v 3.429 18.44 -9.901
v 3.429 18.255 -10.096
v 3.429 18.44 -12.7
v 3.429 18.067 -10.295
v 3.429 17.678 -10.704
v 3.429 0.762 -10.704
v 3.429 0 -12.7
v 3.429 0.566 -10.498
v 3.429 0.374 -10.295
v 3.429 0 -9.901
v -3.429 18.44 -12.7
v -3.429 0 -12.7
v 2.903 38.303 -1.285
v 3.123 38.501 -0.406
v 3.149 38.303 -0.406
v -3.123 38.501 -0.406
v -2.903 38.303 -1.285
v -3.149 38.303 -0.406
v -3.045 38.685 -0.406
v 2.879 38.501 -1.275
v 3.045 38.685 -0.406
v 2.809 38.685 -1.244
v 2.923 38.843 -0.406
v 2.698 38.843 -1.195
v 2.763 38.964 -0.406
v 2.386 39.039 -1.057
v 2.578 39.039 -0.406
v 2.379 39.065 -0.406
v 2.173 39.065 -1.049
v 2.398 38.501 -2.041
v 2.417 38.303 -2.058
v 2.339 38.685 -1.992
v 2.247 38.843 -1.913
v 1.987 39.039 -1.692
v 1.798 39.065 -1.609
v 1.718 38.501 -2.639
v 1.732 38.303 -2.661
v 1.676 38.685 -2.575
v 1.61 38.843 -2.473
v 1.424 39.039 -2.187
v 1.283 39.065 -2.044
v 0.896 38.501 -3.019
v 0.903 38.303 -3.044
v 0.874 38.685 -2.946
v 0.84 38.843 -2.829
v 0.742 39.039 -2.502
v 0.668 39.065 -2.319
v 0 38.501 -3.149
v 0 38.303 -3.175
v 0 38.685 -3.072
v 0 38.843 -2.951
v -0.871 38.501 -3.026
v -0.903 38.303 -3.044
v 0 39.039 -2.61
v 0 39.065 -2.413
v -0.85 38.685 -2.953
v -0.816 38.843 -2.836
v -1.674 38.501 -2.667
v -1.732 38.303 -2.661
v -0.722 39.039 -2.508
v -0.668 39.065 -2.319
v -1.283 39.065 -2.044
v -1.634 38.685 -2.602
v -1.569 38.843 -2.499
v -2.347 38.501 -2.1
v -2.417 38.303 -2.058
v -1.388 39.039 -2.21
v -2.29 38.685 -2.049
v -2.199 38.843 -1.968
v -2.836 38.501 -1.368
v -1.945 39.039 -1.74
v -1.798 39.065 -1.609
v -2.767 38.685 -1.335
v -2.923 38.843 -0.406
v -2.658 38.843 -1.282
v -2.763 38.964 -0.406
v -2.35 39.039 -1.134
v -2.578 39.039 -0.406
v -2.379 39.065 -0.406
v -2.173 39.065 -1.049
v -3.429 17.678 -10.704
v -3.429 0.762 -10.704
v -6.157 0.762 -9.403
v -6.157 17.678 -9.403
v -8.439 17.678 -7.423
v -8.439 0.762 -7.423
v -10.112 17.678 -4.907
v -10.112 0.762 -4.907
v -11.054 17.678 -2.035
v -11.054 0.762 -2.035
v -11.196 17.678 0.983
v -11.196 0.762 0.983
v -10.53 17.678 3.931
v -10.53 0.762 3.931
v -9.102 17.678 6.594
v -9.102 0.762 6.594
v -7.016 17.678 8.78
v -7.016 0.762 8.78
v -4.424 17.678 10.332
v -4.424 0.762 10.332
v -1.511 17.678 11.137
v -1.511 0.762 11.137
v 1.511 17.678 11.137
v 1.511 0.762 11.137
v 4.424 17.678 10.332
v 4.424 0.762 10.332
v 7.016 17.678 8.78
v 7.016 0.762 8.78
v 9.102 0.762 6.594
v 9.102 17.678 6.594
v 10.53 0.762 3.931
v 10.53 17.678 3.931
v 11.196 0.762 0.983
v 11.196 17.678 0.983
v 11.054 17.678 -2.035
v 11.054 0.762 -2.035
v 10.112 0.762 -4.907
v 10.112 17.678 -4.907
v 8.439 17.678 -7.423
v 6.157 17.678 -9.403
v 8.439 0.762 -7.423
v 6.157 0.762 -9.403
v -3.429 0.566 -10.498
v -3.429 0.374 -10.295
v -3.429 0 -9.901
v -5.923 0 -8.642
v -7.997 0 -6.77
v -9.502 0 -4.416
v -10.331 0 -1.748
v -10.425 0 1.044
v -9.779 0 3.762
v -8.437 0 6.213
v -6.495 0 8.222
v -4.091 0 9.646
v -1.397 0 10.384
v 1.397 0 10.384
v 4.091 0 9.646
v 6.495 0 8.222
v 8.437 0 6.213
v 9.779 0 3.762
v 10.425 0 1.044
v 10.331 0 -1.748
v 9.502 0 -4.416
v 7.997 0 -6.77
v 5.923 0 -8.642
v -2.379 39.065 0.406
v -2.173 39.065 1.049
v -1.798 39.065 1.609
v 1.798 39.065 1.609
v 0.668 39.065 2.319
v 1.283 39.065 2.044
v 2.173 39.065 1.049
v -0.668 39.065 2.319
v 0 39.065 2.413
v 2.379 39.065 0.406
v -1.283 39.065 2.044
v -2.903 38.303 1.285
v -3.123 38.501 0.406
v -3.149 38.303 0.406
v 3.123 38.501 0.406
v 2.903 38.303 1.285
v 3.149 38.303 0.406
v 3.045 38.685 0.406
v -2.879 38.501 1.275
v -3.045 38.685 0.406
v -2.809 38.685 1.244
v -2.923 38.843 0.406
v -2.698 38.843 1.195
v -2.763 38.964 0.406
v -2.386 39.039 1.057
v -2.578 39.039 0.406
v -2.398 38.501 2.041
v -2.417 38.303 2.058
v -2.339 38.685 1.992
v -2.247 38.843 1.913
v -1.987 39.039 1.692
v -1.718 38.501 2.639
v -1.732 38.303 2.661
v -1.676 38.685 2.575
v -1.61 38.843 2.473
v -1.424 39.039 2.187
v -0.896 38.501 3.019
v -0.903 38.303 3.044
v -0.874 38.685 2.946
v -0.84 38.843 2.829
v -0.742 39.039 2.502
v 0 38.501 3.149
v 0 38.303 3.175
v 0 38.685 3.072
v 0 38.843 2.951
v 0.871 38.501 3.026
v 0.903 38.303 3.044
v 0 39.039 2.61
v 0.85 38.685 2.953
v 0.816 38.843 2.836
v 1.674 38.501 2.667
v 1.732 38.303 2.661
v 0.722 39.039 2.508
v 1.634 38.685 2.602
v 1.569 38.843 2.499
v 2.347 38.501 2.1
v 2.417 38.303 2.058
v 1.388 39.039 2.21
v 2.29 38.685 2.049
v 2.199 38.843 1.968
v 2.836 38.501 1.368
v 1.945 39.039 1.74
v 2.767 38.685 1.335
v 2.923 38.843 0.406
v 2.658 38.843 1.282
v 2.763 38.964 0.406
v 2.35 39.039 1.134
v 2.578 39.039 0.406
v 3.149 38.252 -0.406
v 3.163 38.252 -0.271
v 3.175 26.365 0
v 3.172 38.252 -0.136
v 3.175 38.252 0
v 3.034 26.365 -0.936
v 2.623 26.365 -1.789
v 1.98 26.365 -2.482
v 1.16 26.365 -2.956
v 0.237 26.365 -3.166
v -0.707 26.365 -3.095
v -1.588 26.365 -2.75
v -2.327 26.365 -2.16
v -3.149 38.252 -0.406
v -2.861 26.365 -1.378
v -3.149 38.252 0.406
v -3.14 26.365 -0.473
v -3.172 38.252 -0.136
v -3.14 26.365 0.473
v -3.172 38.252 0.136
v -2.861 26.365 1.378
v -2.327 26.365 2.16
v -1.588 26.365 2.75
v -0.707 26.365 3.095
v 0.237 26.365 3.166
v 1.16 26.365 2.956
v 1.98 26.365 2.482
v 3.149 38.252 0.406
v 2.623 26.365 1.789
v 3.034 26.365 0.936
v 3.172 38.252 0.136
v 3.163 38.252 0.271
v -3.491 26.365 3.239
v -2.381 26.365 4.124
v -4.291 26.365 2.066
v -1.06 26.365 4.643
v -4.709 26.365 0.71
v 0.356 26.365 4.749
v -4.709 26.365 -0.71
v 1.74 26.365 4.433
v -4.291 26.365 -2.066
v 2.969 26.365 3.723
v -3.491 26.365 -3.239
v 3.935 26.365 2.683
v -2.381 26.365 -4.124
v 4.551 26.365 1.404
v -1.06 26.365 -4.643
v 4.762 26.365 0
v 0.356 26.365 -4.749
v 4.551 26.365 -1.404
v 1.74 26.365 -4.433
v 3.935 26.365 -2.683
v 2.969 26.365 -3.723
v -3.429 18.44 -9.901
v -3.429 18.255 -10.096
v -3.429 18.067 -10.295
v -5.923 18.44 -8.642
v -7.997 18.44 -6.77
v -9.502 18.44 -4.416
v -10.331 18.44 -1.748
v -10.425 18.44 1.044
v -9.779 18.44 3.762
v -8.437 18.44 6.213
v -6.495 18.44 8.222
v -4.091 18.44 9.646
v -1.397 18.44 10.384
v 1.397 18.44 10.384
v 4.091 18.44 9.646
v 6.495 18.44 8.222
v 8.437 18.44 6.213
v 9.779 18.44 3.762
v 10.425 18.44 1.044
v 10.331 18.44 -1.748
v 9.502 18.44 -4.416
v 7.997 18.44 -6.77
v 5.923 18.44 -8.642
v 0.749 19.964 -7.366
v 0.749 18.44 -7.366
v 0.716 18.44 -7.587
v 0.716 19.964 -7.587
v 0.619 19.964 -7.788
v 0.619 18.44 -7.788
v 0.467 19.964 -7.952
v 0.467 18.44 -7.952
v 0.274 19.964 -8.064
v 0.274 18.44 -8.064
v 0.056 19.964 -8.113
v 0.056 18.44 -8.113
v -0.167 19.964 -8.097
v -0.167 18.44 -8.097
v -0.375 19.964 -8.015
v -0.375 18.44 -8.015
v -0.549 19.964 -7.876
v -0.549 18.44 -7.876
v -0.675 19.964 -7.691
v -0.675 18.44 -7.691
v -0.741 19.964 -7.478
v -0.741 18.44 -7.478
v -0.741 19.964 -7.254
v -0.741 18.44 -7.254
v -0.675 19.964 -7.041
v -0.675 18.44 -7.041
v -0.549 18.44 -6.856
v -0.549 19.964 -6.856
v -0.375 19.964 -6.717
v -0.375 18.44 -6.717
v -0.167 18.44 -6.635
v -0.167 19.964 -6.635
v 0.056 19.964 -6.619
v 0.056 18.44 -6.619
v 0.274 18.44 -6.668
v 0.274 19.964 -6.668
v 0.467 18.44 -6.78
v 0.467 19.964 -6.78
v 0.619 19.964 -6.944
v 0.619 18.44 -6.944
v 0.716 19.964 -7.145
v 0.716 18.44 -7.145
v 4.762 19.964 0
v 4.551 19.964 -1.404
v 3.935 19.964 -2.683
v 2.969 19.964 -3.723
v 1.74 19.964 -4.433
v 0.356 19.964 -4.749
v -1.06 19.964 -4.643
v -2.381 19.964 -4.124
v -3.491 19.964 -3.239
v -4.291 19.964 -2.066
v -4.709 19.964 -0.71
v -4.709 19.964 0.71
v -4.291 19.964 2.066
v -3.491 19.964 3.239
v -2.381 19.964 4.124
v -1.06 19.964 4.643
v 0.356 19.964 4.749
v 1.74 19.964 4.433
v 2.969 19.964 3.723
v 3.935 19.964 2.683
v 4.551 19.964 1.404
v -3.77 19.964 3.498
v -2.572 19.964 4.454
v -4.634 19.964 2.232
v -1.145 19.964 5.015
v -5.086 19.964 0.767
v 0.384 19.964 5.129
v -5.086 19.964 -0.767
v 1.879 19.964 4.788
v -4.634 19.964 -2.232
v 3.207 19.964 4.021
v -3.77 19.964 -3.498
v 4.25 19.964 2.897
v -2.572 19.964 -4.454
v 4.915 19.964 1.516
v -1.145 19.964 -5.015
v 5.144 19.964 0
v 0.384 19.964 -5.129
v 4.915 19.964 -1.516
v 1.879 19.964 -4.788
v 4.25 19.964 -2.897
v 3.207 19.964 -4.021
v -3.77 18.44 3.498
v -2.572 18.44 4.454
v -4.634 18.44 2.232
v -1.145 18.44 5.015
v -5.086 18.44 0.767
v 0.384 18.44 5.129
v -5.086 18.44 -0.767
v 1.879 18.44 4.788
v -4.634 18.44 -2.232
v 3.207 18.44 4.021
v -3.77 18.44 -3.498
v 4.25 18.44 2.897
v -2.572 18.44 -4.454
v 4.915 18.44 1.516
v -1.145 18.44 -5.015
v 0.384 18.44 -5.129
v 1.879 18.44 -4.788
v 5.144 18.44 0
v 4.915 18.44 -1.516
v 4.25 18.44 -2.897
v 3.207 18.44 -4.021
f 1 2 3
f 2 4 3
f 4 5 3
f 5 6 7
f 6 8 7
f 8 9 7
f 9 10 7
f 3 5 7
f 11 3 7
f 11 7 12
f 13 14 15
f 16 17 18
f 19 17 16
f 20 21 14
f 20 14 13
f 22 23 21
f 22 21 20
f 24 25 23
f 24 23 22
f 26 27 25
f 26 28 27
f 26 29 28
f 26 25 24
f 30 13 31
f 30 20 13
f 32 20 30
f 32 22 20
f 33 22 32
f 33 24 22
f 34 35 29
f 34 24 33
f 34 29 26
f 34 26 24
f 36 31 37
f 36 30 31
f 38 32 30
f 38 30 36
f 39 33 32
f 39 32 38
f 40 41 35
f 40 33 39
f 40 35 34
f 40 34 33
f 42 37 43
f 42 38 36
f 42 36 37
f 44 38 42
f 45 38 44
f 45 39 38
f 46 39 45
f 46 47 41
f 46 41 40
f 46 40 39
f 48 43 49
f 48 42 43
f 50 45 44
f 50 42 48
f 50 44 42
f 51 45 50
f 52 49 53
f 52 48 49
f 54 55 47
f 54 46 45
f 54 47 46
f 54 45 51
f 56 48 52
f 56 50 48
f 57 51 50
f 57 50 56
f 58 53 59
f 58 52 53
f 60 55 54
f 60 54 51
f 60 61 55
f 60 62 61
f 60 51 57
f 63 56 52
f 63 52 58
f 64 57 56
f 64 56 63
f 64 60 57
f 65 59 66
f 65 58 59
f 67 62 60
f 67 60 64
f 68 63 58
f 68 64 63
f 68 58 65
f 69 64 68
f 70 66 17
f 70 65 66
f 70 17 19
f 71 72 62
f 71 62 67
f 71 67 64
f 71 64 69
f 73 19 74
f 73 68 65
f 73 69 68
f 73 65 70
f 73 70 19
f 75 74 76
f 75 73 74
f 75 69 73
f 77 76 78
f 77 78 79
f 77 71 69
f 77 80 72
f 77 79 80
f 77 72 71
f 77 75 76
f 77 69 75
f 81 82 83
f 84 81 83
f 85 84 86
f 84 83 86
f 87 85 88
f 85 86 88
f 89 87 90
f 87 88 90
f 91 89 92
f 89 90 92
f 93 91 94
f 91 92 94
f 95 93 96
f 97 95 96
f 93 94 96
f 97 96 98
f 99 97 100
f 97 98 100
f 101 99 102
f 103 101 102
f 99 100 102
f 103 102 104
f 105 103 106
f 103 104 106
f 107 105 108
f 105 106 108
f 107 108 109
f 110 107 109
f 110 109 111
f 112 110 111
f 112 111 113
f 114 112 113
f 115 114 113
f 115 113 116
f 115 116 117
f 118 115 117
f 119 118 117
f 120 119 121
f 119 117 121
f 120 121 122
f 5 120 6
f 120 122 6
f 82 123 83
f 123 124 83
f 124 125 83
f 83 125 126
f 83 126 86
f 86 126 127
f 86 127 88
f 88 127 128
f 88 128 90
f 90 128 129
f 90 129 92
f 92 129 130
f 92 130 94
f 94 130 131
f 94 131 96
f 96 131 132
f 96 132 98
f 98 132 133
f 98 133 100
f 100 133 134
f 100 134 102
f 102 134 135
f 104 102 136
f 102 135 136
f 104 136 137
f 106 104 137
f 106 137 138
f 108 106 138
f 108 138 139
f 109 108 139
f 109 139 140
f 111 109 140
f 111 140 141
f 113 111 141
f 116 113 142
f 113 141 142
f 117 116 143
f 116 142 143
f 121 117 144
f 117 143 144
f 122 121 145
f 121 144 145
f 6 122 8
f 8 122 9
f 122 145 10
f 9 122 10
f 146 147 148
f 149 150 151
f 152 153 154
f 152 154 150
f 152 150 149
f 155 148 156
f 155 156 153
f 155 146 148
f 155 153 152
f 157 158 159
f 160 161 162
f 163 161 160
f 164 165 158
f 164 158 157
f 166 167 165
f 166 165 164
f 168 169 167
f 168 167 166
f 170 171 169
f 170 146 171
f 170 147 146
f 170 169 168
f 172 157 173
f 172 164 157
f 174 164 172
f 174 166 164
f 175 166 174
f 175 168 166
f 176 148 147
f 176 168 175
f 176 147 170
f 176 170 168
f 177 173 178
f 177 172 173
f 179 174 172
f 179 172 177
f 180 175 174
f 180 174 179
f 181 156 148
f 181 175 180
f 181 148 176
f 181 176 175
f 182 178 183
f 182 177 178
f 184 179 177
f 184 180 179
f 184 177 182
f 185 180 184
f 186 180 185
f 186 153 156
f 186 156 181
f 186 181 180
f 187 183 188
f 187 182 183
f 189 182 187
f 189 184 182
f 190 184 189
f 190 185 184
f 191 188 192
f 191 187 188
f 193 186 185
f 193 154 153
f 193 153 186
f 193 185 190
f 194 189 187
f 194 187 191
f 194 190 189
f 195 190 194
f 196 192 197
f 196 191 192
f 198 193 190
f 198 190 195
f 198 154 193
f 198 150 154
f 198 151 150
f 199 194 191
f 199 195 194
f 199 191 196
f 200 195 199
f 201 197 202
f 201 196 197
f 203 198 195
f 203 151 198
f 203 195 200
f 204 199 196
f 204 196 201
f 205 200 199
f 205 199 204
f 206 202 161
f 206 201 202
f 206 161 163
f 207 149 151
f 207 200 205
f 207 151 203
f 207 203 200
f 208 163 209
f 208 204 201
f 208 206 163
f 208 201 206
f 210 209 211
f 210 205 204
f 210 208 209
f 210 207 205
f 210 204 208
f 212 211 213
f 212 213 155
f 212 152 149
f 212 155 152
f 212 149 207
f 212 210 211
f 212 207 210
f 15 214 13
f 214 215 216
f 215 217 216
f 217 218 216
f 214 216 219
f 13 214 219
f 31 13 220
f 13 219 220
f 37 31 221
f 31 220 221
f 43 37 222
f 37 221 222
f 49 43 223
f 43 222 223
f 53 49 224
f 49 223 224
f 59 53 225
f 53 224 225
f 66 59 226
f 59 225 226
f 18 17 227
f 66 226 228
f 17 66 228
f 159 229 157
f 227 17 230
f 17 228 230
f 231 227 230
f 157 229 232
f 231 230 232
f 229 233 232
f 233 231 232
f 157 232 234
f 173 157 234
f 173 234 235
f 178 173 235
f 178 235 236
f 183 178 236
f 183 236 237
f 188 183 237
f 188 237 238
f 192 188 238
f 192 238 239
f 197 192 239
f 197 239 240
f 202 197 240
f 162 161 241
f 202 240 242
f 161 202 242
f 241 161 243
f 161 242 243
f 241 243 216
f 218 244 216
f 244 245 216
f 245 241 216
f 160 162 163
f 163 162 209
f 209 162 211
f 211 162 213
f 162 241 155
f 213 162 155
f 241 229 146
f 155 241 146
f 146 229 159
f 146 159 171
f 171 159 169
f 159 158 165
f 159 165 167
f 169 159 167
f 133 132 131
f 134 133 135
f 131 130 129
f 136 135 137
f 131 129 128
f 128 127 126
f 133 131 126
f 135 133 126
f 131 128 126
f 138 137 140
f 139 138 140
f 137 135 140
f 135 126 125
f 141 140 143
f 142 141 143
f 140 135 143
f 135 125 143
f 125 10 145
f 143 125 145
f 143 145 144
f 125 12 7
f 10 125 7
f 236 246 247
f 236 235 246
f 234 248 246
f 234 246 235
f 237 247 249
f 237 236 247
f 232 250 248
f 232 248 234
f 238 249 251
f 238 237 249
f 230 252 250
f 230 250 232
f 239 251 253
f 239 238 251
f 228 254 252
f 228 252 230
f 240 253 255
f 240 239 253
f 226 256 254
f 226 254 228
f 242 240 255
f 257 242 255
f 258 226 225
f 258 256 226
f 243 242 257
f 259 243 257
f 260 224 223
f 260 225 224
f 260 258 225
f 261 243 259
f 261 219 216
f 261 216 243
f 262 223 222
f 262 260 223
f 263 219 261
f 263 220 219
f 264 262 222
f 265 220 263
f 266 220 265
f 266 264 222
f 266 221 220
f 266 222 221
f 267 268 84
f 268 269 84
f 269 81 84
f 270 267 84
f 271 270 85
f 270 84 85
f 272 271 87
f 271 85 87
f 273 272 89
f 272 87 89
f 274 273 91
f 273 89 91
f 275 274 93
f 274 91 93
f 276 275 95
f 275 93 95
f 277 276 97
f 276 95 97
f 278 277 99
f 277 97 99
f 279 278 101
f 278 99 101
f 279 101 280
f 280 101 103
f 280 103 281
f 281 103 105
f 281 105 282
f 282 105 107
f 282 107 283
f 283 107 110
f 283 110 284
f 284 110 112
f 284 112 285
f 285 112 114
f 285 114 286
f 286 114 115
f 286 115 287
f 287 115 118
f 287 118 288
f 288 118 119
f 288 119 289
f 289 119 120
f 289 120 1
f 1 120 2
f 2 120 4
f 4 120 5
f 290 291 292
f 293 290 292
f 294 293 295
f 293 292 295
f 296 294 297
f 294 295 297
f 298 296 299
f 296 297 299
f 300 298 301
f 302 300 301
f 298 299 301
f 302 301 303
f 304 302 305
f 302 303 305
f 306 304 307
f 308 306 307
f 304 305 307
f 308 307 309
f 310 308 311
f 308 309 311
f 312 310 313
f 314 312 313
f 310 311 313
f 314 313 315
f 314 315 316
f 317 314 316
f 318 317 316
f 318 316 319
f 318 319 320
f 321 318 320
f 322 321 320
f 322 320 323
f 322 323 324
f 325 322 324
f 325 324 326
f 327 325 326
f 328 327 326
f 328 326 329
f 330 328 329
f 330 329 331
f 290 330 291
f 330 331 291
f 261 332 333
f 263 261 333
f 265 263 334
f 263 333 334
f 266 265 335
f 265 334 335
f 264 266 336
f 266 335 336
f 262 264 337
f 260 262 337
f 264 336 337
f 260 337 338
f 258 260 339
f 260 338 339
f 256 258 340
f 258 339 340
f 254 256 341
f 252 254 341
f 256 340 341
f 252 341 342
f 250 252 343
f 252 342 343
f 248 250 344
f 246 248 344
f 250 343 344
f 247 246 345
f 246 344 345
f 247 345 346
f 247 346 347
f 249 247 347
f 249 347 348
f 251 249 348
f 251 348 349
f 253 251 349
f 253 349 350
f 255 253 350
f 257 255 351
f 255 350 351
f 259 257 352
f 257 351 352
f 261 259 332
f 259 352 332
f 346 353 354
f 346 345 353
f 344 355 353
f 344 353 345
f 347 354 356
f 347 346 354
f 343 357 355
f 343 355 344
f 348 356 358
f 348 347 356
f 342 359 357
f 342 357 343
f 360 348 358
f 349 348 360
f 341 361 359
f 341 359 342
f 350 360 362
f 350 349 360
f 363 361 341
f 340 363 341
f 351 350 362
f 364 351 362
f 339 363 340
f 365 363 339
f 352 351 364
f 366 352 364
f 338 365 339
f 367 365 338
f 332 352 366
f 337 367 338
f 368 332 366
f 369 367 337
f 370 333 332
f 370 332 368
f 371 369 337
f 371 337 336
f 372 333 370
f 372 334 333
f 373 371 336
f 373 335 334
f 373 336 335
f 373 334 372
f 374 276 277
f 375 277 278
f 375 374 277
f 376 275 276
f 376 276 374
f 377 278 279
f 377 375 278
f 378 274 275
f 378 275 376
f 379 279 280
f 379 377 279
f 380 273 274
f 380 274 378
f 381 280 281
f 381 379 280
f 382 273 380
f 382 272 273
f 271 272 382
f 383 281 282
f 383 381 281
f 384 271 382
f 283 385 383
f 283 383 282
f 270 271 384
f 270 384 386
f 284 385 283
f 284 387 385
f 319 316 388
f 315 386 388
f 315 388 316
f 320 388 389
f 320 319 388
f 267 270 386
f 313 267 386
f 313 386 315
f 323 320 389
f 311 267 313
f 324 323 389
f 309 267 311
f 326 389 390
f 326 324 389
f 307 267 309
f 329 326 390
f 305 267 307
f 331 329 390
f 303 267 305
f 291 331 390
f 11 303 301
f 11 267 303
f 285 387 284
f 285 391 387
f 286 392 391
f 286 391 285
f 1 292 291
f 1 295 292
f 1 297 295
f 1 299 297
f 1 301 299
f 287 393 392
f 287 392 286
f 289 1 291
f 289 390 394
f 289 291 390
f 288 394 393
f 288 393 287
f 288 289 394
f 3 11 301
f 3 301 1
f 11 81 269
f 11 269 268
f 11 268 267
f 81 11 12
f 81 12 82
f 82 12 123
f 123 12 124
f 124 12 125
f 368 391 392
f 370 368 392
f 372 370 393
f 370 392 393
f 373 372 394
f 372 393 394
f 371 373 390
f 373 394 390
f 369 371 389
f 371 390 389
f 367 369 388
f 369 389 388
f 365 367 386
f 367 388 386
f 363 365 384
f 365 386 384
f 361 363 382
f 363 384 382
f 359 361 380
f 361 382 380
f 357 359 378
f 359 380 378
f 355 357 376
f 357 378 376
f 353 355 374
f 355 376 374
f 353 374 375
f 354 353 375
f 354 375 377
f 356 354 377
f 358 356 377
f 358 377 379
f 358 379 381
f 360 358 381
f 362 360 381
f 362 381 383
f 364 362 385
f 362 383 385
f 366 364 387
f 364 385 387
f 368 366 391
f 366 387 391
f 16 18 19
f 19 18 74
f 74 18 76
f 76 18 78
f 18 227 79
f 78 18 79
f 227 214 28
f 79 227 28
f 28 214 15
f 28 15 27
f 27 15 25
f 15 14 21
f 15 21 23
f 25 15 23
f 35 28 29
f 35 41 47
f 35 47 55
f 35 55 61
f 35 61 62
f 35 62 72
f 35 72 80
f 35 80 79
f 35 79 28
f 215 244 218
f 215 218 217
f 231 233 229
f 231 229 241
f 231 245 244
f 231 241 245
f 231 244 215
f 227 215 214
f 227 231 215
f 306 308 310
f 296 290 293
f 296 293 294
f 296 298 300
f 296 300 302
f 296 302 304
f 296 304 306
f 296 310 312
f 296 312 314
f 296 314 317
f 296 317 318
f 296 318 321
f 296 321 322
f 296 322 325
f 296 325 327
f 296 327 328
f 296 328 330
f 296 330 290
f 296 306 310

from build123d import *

# Parameters (mm, degrees)
BODY_DEPTH          = 18.4404
SKETCH3_R           = 5.1435
SKETCH3_R_2         = 0.7493
BOSS_EXTRUDE2_DEPTH = 1.524
SKETCH4_R           = 4.7625
MOUNT_LUG_DEPTH     = 6.4008
SKETCH5_R           = 3.175
SHAFT_DEPTH         = 12.7
FILLET1_R           = 0.762
SKETCH6_W           = 0.8128
SKETCH6_H           = 1.6256
ADJ_SLOT_DEPTH      = 12.2395
ADJ_SLOT_DEPTH_BACK = 12.2395
CHAMFER1_SIZE       = 0.762


with BuildPart() as part:
    # Sketch1 → Body (new body)
    with BuildSketch(Plane(origin=(0, 0, 0), x_dir=(1, 0, 0), z_dir=(0, 1, 0))):
        with BuildLine():
            Line((3.429, 12.7), (-3.429, 12.7))
            Line((-3.429, 12.7), (-3.429, 10.703659152))
            ThreePointArc((-3.429, 10.703659152), (0, -11.2395), (3.429, 10.703659152))
            Line((3.429, 10.703659152), (3.429, 12.7))
        make_face()
    extrude(amount=BODY_DEPTH)

    # Sketch3 → Boss-Extrude2 (add)
    with BuildSketch(Plane(origin=(0, 18.4404, 0), x_dir=(1, 0, 0), z_dir=(0, 1, 0))):
        Circle(SKETCH3_R)
        with Locations((0, 7.366)):
            Circle(SKETCH3_R_2)
    extrude(amount=BOSS_EXTRUDE2_DEPTH)

    # Sketch4 → Mount Lug (add)
    with BuildSketch(Plane(origin=(0, 19.9644, 0), x_dir=(1, 0, 0), z_dir=(0, 1, 0))):
        Circle(SKETCH4_R)
    extrude(amount=MOUNT_LUG_DEPTH)

    # Sketch5 → Shaft (add)
    with BuildSketch(Plane(origin=(0, 26.3652, 0), x_dir=(1, 0, 0), z_dir=(0, 1, 0))):
        Circle(SKETCH5_R)
    extrude(amount=SHAFT_DEPTH)

    # Fillet1
    fillet1_edges = [part.edges().sort_by_distance(p)[0] for p in [
        (-3.175, 39.0652, 0),
    ]]
    fillet(fillet1_edges, radius=FILLET1_R)

    # Sketch6 → Adj. slot (cut, two sides)
    with BuildSketch(Plane(origin=(0, 0, 0), x_dir=(0, 0, -1), z_dir=(1, 0, 0))) as adj_slot_sk:
        with Locations((0, 39.0652)):
            Rectangle(SKETCH6_W, SKETCH6_H)
    extrude(amount=ADJ_SLOT_DEPTH, mode=Mode.SUBTRACT)
    extrude(adj_slot_sk.sketch, amount=-ADJ_SLOT_DEPTH_BACK, mode=Mode.SUBTRACT)

    # Chamfer1
    chamfer1_edges = [part.edges().sort_by_distance(p)[0] for p in [
        (0, 18.4404, 11.2395),
        (0, 0, 11.2395),
    ]]
    chamfer(chamfer1_edges, length=CHAMFER1_SIZE)


solid = part.part
